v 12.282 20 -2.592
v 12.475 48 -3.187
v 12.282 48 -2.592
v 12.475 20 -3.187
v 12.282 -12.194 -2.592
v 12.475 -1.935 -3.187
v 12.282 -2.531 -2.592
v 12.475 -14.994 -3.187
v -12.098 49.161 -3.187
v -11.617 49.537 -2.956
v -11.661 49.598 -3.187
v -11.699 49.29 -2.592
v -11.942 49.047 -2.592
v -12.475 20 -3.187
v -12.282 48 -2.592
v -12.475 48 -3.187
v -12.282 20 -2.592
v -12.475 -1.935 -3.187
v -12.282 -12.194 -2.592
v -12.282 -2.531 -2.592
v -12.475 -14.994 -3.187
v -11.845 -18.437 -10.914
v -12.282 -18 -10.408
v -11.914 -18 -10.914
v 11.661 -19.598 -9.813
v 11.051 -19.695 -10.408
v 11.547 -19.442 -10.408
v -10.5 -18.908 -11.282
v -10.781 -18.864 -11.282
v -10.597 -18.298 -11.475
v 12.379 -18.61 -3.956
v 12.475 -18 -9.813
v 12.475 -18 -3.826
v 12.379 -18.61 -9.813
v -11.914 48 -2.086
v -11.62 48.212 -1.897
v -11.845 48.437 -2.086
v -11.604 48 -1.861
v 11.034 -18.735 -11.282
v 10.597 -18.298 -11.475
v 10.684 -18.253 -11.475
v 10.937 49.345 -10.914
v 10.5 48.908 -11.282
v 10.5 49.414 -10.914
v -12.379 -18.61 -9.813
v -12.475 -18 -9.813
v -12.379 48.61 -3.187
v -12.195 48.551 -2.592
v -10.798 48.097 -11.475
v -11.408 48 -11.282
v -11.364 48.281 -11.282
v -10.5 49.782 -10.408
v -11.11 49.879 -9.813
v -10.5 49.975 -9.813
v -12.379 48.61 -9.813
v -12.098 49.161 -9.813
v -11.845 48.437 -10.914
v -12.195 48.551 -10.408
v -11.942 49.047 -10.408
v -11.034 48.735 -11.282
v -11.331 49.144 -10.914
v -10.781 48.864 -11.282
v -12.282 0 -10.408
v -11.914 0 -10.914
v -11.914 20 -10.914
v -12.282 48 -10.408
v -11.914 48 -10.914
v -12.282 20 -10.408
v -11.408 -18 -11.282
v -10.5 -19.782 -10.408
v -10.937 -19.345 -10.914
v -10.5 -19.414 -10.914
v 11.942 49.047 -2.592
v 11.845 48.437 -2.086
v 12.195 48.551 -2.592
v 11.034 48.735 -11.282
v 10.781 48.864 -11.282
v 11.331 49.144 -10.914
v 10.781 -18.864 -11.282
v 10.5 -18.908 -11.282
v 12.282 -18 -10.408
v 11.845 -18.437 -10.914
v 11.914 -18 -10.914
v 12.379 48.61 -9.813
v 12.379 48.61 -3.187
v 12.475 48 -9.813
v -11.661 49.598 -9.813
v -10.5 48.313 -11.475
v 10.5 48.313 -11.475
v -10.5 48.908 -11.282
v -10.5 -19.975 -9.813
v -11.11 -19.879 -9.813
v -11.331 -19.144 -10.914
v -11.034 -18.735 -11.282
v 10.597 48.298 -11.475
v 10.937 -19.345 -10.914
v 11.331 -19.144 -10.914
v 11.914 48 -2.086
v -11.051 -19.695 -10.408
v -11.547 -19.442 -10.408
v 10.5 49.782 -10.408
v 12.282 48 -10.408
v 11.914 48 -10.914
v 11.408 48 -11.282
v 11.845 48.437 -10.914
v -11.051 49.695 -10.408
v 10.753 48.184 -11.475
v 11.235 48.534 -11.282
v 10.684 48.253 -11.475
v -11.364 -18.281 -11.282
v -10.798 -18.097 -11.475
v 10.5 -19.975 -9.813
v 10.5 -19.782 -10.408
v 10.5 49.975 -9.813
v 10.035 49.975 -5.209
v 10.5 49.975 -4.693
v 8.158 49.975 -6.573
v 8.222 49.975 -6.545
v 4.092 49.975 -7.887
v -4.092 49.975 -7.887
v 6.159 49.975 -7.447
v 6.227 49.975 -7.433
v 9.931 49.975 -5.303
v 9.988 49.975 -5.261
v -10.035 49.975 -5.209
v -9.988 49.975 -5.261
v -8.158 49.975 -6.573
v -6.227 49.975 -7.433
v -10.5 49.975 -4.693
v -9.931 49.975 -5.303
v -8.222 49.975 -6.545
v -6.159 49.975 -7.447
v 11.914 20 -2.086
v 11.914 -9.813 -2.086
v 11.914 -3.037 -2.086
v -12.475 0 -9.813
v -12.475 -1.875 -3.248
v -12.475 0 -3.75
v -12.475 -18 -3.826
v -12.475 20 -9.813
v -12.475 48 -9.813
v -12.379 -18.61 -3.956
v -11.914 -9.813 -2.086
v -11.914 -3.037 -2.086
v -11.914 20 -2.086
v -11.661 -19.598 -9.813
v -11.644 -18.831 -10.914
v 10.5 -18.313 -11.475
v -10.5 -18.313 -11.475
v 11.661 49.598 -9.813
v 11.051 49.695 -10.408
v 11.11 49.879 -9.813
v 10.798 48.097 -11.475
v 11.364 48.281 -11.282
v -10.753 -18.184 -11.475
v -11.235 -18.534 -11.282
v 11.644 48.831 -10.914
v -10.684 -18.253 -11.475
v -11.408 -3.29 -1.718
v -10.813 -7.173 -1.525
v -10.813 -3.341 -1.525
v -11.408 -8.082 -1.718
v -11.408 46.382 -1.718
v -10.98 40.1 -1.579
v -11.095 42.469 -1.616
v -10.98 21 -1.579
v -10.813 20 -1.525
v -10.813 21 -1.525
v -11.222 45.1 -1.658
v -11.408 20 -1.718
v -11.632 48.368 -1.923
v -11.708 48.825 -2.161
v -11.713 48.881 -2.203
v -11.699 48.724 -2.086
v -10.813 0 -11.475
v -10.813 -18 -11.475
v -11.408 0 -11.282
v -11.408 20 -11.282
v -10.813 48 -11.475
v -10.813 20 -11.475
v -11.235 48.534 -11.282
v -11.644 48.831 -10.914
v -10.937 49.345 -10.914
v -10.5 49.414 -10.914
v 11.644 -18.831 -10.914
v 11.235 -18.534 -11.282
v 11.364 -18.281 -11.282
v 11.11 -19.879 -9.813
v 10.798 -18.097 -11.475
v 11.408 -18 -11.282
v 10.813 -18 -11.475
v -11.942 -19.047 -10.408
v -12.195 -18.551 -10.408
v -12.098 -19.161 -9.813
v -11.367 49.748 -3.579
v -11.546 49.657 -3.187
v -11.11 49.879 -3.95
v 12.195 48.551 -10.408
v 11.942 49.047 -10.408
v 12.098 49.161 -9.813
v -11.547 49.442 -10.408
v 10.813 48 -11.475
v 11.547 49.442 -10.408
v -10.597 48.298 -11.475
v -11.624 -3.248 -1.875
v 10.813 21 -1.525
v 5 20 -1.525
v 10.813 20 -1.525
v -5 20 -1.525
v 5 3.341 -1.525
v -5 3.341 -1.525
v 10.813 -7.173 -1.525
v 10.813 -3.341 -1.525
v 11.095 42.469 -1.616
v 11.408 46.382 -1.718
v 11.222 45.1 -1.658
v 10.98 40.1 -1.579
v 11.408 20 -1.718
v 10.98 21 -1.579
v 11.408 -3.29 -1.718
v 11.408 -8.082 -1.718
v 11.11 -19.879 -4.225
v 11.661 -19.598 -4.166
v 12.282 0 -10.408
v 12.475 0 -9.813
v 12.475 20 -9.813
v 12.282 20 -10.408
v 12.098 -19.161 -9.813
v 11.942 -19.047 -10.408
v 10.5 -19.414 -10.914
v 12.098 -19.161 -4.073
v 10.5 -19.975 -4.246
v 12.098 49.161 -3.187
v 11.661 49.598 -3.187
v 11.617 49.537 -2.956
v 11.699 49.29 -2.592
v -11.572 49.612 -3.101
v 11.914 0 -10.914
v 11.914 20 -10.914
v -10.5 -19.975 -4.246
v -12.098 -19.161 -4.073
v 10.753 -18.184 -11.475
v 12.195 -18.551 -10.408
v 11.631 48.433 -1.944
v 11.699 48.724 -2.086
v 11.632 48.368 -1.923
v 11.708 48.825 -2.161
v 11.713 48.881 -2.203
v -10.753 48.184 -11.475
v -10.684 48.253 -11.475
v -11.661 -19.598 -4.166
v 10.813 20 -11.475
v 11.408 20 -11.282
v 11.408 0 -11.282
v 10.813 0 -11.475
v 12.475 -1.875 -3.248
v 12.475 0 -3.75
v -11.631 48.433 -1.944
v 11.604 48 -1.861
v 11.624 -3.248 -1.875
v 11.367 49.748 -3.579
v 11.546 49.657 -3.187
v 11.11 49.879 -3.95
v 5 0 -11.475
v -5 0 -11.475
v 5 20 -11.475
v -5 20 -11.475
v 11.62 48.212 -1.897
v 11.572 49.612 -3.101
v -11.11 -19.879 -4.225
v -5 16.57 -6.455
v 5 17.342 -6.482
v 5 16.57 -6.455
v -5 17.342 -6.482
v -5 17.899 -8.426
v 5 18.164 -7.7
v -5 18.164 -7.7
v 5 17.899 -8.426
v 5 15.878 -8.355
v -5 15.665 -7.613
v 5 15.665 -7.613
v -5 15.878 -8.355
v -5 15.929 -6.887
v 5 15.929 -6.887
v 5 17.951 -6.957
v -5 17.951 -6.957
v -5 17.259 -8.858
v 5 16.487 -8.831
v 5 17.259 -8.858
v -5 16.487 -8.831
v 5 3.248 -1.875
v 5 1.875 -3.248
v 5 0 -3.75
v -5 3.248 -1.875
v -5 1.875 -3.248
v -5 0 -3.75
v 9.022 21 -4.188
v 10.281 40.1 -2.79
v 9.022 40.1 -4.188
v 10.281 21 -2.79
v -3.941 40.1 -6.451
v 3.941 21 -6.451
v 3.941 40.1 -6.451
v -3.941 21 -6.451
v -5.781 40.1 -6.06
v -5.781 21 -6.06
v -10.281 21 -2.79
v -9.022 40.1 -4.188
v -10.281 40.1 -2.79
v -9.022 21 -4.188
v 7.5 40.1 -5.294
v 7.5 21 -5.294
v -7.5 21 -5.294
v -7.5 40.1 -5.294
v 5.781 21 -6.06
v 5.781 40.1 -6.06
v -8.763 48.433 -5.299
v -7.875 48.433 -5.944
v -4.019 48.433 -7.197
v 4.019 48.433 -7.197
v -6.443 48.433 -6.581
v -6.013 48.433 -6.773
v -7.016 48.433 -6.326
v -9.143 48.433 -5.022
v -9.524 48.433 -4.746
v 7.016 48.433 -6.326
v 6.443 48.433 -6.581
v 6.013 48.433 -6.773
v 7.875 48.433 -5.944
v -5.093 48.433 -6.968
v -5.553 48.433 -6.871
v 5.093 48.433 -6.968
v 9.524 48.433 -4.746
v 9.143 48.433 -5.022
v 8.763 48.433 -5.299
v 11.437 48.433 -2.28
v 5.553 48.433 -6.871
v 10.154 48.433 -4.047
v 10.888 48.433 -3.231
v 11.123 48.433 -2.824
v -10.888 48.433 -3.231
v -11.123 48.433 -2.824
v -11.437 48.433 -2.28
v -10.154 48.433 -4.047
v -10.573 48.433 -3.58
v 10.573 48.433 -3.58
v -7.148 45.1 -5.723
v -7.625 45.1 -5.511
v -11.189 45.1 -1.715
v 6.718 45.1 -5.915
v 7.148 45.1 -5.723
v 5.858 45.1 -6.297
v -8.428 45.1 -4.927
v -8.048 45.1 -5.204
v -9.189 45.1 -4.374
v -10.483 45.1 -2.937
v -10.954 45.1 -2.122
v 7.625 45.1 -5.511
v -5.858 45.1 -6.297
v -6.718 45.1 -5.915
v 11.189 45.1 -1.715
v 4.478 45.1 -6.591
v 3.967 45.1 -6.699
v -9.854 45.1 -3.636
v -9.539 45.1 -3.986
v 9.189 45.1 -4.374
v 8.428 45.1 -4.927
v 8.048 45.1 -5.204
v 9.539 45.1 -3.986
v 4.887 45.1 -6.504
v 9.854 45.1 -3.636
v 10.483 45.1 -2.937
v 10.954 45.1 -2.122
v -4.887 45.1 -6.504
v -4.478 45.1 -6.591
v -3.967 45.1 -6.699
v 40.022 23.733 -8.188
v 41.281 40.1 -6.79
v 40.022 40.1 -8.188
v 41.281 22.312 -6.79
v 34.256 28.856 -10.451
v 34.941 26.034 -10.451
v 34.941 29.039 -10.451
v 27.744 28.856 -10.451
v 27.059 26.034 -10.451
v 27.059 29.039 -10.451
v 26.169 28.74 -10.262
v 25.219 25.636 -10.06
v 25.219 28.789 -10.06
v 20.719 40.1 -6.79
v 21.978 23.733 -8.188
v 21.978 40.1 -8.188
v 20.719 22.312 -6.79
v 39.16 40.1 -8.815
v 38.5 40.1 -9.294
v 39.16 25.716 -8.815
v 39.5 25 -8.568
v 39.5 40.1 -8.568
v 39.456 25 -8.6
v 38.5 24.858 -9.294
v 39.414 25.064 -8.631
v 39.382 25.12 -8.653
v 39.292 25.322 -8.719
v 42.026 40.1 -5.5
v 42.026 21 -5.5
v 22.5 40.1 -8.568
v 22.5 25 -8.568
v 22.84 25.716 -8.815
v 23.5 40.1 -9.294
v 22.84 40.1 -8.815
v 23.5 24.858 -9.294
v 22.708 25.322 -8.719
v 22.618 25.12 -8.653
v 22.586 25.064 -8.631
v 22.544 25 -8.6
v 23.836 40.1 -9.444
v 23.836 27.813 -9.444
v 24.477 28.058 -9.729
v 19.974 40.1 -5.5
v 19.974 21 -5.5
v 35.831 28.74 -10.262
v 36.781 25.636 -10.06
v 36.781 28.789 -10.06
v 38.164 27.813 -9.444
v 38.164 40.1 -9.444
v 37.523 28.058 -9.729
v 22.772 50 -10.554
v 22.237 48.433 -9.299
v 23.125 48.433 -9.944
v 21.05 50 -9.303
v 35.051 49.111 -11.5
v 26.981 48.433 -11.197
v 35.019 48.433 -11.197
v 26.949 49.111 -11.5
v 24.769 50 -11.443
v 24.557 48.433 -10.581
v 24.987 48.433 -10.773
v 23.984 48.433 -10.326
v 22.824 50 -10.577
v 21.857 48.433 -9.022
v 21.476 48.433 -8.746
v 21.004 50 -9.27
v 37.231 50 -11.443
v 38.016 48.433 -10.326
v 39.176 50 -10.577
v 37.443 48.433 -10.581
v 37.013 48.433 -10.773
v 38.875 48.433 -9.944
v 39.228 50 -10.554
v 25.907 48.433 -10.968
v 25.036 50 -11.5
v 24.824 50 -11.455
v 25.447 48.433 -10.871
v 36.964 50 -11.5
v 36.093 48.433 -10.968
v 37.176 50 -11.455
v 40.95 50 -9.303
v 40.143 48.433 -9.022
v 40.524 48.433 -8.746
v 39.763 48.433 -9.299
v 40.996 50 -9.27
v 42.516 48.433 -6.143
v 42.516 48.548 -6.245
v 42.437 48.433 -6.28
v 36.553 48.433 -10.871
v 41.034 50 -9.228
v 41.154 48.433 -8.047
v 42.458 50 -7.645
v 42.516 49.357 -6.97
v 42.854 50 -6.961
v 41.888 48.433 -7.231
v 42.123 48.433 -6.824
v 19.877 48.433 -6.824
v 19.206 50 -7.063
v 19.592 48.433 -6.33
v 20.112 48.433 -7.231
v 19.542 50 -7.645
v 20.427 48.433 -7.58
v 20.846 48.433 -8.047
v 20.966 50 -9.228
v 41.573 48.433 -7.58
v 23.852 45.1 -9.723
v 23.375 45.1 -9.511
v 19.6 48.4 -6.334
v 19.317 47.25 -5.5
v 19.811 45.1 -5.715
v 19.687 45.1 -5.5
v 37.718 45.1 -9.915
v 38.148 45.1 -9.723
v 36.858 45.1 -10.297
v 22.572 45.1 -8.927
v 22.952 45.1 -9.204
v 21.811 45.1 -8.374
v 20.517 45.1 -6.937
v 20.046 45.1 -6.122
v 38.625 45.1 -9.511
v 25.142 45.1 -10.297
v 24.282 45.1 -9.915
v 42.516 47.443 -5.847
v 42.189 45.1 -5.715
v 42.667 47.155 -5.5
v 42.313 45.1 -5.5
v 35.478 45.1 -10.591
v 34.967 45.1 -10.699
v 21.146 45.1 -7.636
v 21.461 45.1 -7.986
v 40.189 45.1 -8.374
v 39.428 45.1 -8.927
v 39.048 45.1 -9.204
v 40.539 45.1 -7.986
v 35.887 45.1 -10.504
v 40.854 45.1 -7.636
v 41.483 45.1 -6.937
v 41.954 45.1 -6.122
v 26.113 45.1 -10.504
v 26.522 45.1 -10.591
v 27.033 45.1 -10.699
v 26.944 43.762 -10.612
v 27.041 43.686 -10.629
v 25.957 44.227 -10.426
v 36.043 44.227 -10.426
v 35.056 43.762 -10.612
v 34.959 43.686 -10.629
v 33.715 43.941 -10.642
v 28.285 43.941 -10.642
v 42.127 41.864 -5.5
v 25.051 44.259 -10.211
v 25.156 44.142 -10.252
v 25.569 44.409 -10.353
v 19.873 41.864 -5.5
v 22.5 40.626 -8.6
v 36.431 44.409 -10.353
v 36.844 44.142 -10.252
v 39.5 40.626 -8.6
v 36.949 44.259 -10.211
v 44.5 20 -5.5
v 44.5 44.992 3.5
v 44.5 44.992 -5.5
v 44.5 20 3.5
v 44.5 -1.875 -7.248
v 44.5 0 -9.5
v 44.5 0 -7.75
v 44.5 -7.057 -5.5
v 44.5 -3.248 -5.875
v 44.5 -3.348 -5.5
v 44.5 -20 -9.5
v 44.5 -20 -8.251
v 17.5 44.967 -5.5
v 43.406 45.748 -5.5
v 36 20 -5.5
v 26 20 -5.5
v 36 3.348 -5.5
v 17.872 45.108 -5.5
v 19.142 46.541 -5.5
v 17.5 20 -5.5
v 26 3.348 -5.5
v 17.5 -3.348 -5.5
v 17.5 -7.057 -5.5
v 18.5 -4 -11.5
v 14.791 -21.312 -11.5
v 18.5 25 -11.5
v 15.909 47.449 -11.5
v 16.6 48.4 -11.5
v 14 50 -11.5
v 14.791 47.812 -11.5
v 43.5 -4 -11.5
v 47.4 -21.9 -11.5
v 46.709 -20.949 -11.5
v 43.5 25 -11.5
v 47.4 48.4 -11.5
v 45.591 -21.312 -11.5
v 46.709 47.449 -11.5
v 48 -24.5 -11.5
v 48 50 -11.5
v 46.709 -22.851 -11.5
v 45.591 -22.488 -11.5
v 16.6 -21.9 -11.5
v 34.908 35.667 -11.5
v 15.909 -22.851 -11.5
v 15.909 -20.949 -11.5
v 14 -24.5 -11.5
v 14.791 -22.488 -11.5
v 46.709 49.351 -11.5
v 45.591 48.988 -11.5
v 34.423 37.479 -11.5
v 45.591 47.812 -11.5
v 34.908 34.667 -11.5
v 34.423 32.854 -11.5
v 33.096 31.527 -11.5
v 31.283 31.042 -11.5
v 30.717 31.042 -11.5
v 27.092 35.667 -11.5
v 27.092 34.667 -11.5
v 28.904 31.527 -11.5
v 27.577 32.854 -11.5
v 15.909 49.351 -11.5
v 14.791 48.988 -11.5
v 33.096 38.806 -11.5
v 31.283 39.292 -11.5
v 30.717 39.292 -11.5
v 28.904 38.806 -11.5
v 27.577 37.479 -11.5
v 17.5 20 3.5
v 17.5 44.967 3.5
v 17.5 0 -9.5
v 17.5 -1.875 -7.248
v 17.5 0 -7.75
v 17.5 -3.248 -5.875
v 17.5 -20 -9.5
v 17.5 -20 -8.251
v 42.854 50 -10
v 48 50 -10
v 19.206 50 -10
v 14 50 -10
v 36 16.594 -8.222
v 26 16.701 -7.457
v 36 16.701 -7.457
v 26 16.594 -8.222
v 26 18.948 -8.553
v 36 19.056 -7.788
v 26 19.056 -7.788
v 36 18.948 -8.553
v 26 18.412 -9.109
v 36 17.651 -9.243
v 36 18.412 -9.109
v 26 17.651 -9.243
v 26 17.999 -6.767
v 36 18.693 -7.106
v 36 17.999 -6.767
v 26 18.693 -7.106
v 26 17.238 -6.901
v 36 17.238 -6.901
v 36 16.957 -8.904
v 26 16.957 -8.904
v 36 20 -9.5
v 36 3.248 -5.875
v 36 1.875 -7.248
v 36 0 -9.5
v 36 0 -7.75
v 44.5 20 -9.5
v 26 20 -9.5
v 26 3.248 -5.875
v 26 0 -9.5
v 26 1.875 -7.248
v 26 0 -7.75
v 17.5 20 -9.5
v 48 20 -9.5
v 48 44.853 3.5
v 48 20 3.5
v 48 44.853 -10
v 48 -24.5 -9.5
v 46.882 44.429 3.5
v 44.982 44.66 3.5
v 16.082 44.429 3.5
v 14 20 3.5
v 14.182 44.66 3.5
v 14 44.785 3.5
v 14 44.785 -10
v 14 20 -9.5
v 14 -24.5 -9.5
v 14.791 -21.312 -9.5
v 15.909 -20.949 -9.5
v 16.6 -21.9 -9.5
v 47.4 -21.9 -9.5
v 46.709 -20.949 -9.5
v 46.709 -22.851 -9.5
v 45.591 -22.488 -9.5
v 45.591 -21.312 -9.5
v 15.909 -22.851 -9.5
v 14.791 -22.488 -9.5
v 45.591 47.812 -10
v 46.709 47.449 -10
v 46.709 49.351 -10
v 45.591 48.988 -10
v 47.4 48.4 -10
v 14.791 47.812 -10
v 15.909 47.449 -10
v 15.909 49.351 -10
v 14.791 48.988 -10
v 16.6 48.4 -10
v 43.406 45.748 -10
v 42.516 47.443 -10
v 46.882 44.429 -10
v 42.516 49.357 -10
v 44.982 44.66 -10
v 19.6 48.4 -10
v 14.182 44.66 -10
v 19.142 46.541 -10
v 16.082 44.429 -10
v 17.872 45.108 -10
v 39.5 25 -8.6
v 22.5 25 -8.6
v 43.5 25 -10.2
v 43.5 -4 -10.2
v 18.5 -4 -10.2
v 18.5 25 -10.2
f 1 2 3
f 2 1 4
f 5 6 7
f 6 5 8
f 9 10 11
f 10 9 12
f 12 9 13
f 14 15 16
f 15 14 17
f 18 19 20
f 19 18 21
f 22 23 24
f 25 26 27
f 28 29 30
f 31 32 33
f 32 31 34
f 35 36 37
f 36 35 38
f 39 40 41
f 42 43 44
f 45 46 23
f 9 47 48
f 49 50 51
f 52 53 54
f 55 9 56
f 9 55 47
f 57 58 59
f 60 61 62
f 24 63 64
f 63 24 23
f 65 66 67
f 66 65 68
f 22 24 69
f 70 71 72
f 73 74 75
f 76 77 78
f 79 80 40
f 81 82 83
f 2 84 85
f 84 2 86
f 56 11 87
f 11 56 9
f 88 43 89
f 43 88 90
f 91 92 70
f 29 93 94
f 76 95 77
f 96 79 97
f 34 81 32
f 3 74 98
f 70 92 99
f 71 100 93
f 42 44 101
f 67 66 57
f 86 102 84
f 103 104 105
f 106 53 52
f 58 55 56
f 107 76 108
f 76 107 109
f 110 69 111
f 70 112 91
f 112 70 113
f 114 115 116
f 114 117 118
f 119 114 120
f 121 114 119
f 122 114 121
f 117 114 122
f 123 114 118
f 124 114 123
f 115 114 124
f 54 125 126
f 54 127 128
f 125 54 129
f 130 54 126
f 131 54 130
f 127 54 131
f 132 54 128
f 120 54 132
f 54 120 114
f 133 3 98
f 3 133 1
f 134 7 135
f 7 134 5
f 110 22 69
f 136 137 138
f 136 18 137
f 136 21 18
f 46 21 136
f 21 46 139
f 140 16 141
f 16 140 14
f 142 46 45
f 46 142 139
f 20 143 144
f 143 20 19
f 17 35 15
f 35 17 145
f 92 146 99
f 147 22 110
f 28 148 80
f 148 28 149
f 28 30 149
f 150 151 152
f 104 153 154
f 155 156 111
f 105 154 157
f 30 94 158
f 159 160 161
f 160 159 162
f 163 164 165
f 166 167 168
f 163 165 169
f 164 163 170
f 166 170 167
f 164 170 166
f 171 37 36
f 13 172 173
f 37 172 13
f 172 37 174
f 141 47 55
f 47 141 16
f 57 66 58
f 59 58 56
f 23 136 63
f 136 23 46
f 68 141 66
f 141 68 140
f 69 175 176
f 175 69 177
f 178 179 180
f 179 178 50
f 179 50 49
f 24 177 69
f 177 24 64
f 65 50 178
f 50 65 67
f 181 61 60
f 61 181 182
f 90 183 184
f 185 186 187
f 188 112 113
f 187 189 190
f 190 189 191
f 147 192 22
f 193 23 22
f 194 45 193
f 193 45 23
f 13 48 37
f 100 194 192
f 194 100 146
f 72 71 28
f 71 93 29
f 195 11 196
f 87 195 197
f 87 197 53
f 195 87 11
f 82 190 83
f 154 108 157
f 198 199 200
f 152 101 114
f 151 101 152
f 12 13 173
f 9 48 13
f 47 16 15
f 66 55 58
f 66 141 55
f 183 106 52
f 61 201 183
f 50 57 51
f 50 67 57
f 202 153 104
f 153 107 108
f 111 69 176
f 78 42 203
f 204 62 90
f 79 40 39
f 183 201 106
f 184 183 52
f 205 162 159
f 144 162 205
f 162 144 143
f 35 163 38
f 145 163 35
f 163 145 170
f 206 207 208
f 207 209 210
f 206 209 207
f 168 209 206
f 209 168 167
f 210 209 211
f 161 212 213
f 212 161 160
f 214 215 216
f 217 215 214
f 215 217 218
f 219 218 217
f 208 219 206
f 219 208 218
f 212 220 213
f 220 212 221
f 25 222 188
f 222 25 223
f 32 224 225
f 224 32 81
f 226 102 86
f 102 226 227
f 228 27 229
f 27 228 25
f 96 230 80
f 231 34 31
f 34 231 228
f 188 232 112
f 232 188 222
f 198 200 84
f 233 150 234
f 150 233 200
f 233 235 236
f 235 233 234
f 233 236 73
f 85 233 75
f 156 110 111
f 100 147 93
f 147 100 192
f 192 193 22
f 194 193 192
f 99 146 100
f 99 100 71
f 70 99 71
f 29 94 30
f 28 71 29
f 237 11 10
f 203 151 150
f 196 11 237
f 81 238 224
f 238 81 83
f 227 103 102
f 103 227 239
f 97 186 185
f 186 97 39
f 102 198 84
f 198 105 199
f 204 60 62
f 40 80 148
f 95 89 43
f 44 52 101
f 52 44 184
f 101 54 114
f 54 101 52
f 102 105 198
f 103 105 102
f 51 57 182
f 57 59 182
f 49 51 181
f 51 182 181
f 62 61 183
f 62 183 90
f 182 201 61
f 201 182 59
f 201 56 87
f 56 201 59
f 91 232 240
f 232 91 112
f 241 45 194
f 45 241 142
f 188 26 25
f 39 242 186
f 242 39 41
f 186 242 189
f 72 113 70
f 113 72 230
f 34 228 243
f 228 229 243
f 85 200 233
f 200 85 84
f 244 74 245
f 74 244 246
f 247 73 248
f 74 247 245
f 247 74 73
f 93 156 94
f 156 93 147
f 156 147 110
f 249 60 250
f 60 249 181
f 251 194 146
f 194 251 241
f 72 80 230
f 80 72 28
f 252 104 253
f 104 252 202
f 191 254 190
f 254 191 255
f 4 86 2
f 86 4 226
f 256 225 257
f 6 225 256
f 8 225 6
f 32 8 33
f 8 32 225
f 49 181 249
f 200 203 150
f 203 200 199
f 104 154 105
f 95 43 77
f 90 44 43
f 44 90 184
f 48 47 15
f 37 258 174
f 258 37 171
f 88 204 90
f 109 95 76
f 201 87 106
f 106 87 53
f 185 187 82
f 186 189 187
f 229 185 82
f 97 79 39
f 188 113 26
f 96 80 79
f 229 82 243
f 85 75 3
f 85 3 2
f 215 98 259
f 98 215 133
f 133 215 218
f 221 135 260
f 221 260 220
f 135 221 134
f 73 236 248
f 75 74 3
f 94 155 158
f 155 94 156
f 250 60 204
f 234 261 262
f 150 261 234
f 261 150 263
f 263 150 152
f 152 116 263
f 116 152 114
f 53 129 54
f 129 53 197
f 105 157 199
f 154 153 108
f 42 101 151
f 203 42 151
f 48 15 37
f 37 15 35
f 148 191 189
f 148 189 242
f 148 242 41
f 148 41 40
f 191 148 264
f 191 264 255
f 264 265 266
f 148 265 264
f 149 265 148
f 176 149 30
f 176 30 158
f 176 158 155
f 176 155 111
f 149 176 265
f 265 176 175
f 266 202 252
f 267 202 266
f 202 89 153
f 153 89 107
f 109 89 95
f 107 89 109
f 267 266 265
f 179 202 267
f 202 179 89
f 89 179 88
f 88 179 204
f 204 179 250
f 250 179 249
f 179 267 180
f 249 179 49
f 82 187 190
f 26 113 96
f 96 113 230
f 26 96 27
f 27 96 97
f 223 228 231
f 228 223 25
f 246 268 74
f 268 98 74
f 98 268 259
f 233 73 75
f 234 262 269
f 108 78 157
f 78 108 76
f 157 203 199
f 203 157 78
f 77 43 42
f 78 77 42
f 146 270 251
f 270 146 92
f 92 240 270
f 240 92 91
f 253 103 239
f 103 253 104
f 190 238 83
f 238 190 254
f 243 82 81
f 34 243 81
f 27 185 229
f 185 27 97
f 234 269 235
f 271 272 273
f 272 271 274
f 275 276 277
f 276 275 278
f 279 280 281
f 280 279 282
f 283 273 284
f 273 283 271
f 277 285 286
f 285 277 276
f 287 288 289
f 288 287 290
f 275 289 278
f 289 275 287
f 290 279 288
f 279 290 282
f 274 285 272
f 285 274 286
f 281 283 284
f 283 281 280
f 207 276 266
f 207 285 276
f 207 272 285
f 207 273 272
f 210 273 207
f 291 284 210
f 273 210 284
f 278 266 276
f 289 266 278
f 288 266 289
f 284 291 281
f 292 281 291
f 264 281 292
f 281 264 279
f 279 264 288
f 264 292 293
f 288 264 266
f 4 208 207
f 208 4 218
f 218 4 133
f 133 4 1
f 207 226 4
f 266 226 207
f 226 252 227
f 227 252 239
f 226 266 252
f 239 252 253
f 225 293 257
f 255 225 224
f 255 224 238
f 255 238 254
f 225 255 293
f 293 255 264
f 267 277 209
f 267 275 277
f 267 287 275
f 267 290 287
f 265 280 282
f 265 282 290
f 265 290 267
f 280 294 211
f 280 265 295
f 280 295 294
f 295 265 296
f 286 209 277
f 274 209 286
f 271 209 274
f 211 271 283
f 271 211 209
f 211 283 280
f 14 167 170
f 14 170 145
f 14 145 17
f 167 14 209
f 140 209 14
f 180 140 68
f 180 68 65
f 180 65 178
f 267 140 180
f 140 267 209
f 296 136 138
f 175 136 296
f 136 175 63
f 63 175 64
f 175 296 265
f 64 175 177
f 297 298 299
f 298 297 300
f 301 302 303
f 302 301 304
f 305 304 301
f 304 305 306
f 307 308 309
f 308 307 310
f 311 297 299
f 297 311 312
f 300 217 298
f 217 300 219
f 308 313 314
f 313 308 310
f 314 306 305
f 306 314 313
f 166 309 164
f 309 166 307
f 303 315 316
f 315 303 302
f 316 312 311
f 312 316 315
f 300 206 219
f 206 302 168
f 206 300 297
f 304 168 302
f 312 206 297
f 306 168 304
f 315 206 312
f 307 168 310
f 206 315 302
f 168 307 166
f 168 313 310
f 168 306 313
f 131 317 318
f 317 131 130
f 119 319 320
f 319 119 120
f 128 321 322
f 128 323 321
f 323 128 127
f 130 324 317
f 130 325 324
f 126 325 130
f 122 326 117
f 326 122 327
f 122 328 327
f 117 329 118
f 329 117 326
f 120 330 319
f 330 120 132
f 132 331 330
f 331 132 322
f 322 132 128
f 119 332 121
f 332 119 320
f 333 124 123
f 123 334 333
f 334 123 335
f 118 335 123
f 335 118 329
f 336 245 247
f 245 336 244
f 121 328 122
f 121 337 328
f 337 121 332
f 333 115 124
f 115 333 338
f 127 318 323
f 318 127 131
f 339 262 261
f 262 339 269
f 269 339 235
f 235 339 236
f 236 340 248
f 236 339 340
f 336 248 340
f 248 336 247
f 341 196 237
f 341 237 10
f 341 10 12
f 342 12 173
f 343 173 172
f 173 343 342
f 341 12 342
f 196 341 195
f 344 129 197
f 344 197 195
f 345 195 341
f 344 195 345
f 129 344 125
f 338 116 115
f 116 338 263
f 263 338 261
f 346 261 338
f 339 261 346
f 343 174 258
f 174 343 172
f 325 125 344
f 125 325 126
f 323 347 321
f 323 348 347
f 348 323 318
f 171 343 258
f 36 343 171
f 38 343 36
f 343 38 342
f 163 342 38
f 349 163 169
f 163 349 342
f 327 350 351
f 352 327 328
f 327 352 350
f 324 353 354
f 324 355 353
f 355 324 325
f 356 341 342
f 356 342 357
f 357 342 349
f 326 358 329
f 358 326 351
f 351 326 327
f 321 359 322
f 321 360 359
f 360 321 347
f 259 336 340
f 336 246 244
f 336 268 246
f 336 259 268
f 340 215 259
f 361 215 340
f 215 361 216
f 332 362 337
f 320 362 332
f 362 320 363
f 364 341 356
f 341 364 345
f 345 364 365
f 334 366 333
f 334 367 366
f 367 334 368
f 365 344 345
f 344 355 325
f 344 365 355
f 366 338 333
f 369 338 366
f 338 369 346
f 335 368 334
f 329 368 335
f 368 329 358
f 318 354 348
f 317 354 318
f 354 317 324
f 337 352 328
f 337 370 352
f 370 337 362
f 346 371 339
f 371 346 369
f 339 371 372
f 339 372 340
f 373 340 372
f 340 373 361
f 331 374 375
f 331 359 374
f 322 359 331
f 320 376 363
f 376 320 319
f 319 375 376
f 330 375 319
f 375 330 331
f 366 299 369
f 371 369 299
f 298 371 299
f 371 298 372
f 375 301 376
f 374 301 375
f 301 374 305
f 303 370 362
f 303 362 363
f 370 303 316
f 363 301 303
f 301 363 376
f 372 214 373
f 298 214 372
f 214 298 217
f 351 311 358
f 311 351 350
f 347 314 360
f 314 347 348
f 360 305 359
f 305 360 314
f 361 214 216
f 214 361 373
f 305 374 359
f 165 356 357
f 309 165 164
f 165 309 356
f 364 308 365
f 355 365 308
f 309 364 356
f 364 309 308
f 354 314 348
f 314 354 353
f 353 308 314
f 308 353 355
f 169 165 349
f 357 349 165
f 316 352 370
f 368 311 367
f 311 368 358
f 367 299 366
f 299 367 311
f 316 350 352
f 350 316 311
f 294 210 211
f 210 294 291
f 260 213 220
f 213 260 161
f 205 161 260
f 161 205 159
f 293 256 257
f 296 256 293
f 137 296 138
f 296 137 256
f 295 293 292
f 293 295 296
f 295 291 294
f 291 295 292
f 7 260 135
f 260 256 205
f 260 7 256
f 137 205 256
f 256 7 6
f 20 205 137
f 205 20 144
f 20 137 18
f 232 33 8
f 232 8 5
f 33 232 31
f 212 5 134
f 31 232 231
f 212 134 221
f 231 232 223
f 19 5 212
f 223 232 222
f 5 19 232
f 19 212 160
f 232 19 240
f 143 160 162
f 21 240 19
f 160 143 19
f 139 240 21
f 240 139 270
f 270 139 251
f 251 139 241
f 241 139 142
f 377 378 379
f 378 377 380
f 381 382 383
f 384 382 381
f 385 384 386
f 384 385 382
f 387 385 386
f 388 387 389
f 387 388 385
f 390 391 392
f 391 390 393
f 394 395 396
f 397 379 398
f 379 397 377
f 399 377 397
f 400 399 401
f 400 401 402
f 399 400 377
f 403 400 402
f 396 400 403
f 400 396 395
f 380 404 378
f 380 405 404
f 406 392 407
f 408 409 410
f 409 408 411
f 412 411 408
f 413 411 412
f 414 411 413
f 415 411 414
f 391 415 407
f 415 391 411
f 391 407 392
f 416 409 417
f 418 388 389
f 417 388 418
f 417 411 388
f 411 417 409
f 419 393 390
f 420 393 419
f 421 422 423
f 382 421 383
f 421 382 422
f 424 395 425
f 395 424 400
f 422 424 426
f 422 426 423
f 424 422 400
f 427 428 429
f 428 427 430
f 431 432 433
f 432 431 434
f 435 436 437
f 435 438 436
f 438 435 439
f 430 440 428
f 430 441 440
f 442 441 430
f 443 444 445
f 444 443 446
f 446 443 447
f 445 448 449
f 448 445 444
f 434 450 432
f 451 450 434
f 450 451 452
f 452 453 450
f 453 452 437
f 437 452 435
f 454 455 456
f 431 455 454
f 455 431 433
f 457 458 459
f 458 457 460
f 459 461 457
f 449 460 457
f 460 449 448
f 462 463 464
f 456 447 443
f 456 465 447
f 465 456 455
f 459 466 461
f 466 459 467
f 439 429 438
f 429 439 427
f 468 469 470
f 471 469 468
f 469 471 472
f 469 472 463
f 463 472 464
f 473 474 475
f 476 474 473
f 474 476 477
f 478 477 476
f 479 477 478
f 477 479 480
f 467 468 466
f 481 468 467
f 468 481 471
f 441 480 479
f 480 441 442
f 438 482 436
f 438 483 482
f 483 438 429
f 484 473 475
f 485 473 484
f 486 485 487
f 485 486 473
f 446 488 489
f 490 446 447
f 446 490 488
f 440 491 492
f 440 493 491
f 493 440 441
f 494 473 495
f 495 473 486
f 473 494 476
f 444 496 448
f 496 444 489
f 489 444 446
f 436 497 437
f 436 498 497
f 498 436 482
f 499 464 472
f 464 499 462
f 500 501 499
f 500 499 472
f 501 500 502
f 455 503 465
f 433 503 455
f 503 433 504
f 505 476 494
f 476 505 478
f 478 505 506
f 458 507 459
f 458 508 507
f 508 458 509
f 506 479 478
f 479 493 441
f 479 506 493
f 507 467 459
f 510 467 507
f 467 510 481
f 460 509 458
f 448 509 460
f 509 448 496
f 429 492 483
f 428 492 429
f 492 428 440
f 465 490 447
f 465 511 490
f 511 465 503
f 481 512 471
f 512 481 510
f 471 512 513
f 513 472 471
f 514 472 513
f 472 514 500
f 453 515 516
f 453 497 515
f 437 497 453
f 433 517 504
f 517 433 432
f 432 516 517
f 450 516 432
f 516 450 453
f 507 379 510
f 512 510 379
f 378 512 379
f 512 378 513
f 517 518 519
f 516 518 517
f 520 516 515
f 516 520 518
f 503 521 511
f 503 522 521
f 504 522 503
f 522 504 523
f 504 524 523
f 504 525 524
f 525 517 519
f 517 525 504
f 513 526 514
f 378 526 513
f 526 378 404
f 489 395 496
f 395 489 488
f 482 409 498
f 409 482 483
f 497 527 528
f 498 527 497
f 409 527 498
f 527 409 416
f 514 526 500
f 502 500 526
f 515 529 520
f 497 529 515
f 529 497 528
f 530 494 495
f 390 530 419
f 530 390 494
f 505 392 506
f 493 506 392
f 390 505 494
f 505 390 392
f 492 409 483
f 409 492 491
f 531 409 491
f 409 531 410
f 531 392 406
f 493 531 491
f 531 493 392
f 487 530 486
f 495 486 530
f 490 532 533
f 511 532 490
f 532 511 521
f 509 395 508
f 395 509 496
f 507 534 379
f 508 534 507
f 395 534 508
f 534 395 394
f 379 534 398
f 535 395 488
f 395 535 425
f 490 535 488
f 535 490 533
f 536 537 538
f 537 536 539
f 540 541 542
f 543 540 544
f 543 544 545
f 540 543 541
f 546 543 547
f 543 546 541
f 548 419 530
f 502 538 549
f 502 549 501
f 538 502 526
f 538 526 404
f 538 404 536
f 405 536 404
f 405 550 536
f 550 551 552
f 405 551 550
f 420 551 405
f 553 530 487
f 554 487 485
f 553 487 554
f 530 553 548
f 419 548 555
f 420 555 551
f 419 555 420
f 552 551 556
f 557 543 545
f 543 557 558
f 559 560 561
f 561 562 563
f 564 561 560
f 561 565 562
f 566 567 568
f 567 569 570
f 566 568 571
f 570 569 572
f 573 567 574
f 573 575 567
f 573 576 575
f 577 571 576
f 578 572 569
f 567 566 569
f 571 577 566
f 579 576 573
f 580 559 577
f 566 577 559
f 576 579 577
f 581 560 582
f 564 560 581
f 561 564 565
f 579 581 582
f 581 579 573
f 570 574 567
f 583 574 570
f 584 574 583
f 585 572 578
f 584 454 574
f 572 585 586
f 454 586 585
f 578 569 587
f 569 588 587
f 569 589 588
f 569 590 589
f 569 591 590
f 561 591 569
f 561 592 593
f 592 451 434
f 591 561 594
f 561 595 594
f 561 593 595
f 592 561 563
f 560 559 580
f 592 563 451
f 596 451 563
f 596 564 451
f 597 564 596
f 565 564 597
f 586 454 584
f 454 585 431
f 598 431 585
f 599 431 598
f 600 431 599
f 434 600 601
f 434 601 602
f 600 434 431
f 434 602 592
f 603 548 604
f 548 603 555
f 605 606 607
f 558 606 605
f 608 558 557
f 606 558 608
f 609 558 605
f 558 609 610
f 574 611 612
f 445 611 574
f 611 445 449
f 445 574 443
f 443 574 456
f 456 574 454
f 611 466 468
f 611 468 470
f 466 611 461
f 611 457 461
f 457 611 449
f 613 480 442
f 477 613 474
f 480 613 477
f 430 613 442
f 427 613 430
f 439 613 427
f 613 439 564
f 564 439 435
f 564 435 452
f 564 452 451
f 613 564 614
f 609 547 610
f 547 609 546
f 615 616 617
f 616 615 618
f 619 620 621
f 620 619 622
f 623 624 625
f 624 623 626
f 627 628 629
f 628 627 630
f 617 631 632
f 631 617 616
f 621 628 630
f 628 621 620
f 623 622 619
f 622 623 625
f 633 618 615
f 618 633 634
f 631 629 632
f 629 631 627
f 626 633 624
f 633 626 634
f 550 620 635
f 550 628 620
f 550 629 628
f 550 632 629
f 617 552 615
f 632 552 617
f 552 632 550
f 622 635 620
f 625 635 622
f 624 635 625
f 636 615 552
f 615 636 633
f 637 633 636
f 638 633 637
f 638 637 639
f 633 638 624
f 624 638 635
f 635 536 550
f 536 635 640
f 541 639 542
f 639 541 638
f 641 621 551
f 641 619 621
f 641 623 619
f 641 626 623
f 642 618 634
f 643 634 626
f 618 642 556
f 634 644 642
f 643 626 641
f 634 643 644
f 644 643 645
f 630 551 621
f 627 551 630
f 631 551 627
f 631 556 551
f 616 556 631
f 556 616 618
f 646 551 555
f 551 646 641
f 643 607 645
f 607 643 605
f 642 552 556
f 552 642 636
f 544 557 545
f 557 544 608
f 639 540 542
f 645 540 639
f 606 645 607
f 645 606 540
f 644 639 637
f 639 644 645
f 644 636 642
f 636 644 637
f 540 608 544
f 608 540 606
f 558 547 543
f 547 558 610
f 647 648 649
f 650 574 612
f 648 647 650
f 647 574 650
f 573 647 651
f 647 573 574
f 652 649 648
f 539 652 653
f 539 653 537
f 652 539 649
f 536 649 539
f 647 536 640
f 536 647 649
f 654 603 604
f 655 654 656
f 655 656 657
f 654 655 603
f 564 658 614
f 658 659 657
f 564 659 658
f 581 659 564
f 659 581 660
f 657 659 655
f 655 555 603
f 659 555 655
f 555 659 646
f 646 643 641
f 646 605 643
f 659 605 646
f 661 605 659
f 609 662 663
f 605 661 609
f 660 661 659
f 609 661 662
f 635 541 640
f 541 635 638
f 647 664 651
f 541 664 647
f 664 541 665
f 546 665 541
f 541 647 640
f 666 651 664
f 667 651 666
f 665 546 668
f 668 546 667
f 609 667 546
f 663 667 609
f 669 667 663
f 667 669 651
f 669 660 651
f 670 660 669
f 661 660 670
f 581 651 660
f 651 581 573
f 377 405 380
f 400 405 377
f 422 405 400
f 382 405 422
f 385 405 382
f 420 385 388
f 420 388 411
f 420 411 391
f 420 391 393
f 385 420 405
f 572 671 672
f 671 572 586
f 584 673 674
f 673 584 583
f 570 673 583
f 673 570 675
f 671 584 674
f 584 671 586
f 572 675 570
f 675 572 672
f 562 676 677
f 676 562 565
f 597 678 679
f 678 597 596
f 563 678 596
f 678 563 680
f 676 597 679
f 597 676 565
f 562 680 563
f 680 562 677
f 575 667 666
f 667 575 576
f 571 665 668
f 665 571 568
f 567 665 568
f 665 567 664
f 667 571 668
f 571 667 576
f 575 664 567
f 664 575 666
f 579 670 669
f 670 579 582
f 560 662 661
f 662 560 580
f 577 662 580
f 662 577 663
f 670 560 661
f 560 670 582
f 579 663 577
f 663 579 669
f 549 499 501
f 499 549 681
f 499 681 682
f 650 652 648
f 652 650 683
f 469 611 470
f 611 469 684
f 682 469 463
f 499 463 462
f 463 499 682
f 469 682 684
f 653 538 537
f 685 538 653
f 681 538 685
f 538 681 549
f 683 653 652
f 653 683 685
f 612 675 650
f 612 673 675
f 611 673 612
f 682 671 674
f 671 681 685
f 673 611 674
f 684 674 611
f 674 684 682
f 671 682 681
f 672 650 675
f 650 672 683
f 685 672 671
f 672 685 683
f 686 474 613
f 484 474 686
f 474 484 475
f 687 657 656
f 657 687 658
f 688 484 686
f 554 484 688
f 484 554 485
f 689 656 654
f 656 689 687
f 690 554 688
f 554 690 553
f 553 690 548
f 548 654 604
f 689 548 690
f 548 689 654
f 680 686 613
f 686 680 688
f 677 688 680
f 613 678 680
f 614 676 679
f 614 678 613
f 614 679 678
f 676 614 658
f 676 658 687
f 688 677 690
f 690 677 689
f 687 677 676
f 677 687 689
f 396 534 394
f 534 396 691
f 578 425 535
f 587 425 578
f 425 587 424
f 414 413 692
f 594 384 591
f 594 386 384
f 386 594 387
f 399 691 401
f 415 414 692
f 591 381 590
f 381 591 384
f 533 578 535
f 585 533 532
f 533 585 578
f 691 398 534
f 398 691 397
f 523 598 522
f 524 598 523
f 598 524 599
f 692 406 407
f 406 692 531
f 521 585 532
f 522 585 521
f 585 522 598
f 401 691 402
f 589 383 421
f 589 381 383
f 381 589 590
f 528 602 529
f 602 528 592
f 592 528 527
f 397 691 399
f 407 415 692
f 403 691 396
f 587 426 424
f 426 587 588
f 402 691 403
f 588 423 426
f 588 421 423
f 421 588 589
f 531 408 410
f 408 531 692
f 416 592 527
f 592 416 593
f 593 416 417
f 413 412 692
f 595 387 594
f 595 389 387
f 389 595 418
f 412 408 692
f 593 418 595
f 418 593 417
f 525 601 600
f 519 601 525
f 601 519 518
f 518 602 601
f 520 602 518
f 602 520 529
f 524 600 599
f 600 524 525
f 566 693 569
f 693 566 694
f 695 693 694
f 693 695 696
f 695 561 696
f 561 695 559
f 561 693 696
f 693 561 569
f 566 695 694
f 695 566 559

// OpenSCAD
//Diamter of the spring coil
spring_diameter = 7.5;
//Diameter of hole for spring wire, significantly oversized
spring_wire_diameter = 2.5;
//Angle between horizontal and a line from the centre of
//the spring to the to the wire hole
lower_spring_angle = -8;
upper_spring_angle = -20;
//Distance from the centre of the spring to the centre of the wire hole
spring_dist = 18;
//Width of the spring (measure space between two arms (undersize this)
spring_width = 10;
spring_extra_space = 2;
spring_cutout_len = spring_dist+spring_extra_space;

//Seperation of plates when the they are parallel
plate_sep = 3;

//Length that covers the finger
finger_len = 29;
//Diameter of the cutout
finger_diam = 18;
//Finger cut out widened by:
finger_extra_width = 6;
//Cut-out offet
finger_offset_z = 2.5;

len_2_pivot = finger_len+spring_dist+3;

length = len_2_pivot+20;
width = 25;
height = 10;

//Sets the angle of pinch mechanism
max_open_angle = 12;

//Parameters for walls to keep clip inline
wall_width = 3.5;
gap_to_wall = 1;

//Used to ensure areas overlap for boolean operations
fuzz = .1;

clip();
translate([width+6,0,-height+6])
{
    clip_with_walls(6);
    
}
module clip_with_walls(height=height)
{
    difference()
    {
        union()
        {
            clip(width+2,height,spring_angle=lower_spring_angle,rounded=false);
            translate([width/2+gap_to_wall,spring_cutout_len,-plate_sep/2-height])
                cube([wall_width,len_2_pivot-spring_cutout_len,2*height+plate_sep]);
            
            translate([-width/2-gap_to_wall-wall_width,spring_cutout_len,-plate_sep/2-height])
                cube([wall_width,len_2_pivot-spring_cutout_len,2*height+plate_sep]);
            translate([0,len_2_pivot-13.5-35-3.5,-plate_sep/2-height+1])
                cube([34,45,2],center=true);
            translate([0,len_2_pivot-finger_len+height,-plate_sep/2])
                rotate([0,90,0])rotate([0,0,-90])
                hull()quater_pipe(height,width,true); // this is a bit stupid, but works
        }
        translate([0,len_2_pivot-finger_diam/2-6,-plate_sep/2-height-fuzz])
            hull()
            {
                cylinder(d=7.5,h=1);
                translate([-8.5,-10,3])cube([17,30,1]);
            }

        translate([-25/2,-4,-plate_sep/2-height-fuzz])
            cube([25,finger_len,1.4]);
        
        sx = 17-1.6;
        sy = 73.5/2-1.6;
        translate([0,len_2_pivot-73.5/2,-height])
        {
            translate([sx,sy,0])cylinder(d=2,h=999,center=true);
            translate([-sx,sy,0])cylinder(d=2,h=999,center=true);
            translate([sx,-sy,0])cylinder(d=2,h=999,center=true);
            translate([-sx,-sy,0])cylinder(d=2,h=999,center=true);
            translate([sx,sy,0])cylinder(d=8,h=999);
            translate([-sx,sy,0])cylinder(d=8,h=999);
        }
        
    }
    
    
}

module clip(width=width,height=height,spring_angle=upper_spring_angle,rounded=true)
{
    difference(){
        translate([0,0,-plate_sep/2]){
            difference(){
                //Main block
                translate([0,-length/2+len_2_pivot,-height/2])
                    if (rounded)
                    {
                        r_cube([width,length,height],r=2,center=true);
                    }
                    else
                    {
                        cube([width,length,height],center=true);
                    }
                
                
                //Hole for spring wire
                rotate([spring_angle,0,0])
                translate([0,spring_dist,0])
                rotate([0,90,0])
                cylinder(d=spring_wire_diameter,h=999,center=true,$fn=10);
                
                //Cutout to thin area for spring
                translate([width/2+spring_width/2,spring_dist/2+1,-height/2])
                cube([width,spring_cutout_len,2*height],center=true);
                //Cutout to thin area for spring
                translate([-(width/2+spring_width/2),spring_dist/2+1,-height/2])
                cube([width,spring_cutout_len,2*height],center=true);
            }
        }
        
        //Widened and splayed cut-out for finger
        translate([0,len_2_pivot-finger_len,finger_offset_z])
        rotate([-90,0,0])
        splayed_stretched_cyl(d=finger_diam,h=finger_len+fuzz,ds=finger_diam+3,hs=10,stretch=finger_extra_width,sp_bottom=false);

        
        //Hole for the coil of the spring
        rotate([0,90,0])
        cylinder(d=spring_diameter,h=999,center=true);
        
        //Cutout to slope the back of the clip
        rotate([max_open_angle,0,0])
        translate([0,-length/2,height/2])
        cube([width+fuzz,length,height],center=true);
    }
}

module splayed_stretched_cyl(d,h,ds,hs,stretch,sp_bottom=true,center=false)
{
    ang = sp_bottom ? 0 : 180;
    flip_translation = sp_bottom ? 0 : h;
    center_translation = center ? -h/2 : 0;
    translate([0,0,center_translation])
    translate([0,0,flip_translation])
    rotate([0,ang,0])
    {
        delta_d = ds-d;
        hull()
        {
            translate([-stretch/2,0,0])
            cylinder(d=d,h=h,$fn=30);
            translate([stretch/2,0,0])
            cylinder(d=d,h=h,$fn=30);
        }
        hull()
        {
            translate([-stretch/2,0,0])
            cylinder(d1=ds,d2=d,h=hs/3,$fn=30);
            translate([stretch/2,0,0])
            cylinder(d1=ds,d2=d,h=hs/3,$fn=30);
        }
        hull()
        {
            translate([-stretch/2,0,0])
            cylinder(d1=d+2*delta_d/3,d2=d,h=2*hs/3,$fn=30);
            translate([stretch/2,0,0])
            cylinder(d1=d+2*delta_d/3,d2=d,h=2*hs/3,$fn=30);
        }
        hull()
        {
            translate([-stretch/2,0,0])
            cylinder(d1=d+delta_d/3,d2=d,h=hs,$fn=30);
            translate([stretch/2,0,0])
            cylinder(d1=d+delta_d/3,d2=d,h=hs,$fn=30);
        }
    }
}

module r_cube(size,r,center=false,fn=20)
{
    c_trans = center ? [0,0,0] : size/2;
    translate(c_trans)
        minkowski()
        {
          cube([size[0]-2*r, size[1]-2*r, size[2]-2*r],center=true);
          sphere(r=r,$fn=fn);
        }
        
}

module quater_pipe(r,h,center=false){
    ct = center? [0,0,-h/2] : [0,0,0];
    translate(ct)
    {
        difference()
        {
            cube([r,r,h]);
            translate([0,0,-fuzz])
                cylinder(r=r,h=999,$fn=15);
        }
    }
}
